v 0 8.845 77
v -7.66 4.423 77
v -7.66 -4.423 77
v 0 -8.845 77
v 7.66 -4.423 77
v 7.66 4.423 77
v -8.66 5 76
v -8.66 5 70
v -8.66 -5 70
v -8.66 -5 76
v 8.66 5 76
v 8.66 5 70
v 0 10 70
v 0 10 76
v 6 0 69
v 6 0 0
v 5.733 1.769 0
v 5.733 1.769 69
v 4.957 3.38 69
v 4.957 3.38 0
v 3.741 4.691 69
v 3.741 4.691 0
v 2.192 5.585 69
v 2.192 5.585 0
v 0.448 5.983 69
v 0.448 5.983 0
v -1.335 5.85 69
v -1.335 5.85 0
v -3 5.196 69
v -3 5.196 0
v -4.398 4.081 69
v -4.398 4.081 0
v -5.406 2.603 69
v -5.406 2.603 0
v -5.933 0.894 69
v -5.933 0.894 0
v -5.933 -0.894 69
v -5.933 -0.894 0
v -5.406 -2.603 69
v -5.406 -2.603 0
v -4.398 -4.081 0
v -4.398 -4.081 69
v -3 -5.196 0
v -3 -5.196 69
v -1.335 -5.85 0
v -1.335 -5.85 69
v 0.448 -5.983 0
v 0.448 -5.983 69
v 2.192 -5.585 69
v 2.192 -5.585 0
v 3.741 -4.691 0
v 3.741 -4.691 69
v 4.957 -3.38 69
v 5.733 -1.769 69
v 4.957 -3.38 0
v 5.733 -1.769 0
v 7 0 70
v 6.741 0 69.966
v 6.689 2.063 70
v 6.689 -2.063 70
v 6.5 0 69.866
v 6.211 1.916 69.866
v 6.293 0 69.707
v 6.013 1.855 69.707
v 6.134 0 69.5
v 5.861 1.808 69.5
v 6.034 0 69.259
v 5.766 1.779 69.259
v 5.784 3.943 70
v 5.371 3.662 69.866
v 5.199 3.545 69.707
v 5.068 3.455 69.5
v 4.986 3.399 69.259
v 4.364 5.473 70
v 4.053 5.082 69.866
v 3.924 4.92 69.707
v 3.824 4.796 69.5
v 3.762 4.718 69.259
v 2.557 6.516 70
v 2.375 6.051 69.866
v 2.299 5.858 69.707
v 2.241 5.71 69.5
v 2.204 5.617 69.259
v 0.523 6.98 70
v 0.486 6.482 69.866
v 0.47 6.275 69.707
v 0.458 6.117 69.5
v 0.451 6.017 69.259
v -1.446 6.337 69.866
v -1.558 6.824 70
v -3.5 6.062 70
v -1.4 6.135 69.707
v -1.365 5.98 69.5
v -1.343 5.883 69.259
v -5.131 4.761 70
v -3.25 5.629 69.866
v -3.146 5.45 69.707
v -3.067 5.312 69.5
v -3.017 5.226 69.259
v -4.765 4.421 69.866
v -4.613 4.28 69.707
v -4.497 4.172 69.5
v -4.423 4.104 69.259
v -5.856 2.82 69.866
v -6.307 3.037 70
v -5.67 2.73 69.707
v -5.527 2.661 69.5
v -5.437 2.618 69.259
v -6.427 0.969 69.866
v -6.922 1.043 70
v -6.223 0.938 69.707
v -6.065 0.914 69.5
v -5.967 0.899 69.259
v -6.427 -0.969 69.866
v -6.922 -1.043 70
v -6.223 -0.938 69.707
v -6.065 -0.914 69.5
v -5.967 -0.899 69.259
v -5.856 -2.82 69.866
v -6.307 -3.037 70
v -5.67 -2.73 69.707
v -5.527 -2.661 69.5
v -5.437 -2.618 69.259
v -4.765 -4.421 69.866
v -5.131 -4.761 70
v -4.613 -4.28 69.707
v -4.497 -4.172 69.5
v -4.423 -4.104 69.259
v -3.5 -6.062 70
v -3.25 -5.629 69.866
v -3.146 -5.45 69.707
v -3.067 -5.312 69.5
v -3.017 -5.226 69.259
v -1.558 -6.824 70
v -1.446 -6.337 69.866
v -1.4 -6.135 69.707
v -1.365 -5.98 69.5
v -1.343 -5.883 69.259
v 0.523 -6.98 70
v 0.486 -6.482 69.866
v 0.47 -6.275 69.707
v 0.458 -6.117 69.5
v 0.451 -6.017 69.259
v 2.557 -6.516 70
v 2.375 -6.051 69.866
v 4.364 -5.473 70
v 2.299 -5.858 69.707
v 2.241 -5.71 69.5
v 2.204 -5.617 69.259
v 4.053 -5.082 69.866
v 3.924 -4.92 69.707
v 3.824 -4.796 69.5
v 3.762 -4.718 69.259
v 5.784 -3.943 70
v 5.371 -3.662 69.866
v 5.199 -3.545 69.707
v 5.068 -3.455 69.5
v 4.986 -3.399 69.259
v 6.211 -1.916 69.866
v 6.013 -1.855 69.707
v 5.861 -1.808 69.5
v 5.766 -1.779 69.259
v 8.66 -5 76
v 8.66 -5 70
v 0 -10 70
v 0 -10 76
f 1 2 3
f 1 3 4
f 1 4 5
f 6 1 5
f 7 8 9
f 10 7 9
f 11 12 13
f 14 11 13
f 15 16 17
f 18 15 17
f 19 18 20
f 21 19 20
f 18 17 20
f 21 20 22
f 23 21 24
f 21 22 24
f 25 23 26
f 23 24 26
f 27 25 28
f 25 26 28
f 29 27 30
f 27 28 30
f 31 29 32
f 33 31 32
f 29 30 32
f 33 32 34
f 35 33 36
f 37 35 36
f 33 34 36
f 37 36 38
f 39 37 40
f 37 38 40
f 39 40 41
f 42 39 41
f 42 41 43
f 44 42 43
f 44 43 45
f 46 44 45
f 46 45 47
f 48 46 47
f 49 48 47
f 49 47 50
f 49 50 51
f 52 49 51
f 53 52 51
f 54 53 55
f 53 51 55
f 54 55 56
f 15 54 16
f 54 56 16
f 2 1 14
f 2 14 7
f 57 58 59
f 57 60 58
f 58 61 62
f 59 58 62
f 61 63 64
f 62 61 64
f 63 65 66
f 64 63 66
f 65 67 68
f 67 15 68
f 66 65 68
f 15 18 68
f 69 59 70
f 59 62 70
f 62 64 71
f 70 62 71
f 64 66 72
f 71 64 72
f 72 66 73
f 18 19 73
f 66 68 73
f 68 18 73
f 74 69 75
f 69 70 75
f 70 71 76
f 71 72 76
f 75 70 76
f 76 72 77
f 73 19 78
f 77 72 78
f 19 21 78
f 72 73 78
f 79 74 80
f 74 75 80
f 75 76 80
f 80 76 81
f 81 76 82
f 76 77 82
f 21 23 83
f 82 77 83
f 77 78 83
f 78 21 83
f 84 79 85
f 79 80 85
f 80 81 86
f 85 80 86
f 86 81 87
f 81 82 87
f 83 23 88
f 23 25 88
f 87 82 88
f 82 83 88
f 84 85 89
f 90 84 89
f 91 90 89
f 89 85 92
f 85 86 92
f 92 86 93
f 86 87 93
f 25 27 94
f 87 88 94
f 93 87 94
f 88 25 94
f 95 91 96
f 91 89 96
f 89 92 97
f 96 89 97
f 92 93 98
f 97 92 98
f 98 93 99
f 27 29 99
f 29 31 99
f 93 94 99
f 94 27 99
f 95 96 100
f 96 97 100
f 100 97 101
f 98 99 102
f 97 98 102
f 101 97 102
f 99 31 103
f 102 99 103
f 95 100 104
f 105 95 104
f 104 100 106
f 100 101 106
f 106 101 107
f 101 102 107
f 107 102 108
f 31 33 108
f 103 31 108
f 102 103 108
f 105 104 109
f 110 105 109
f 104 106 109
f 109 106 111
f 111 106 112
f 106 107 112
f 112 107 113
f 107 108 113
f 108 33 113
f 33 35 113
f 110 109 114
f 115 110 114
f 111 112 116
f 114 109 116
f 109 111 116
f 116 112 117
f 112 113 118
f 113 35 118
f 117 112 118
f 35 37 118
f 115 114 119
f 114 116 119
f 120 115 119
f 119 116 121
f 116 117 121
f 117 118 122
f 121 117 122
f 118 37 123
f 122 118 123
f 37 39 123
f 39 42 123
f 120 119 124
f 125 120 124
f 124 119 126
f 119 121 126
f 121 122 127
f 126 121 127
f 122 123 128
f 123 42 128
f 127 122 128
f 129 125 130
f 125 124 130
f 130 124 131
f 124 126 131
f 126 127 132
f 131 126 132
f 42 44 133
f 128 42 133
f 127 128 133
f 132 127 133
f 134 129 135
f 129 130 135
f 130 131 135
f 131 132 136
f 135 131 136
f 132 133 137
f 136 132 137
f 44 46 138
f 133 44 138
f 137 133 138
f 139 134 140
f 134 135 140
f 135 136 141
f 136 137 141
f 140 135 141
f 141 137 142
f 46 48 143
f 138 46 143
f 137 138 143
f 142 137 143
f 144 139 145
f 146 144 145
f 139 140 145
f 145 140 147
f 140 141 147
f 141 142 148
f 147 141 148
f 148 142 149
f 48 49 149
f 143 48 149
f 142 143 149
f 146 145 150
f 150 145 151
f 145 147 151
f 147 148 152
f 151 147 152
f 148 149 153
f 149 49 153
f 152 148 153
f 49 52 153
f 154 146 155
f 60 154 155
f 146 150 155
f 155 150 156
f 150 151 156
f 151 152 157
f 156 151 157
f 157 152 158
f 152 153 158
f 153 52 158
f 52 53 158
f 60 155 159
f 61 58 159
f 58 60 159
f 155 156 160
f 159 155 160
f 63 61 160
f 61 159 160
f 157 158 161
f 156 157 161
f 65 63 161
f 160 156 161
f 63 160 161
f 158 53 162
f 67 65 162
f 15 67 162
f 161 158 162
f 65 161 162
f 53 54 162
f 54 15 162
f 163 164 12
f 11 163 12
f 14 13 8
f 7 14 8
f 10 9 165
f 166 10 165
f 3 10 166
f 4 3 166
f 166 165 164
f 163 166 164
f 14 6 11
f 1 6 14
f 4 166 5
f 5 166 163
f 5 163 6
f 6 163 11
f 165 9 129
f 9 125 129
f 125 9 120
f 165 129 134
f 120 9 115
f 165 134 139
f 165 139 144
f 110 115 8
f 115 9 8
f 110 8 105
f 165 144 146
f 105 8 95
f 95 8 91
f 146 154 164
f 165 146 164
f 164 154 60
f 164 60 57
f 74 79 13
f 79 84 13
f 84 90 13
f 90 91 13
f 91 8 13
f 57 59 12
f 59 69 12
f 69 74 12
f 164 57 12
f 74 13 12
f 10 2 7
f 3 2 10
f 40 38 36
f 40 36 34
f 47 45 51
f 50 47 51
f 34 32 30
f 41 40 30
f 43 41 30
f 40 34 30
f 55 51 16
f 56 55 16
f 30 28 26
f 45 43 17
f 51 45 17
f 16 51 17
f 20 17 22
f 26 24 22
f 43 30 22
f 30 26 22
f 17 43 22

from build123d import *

# Parameters (mm, degrees)
CROQUIS1_R              = 6
SALIENTE_EXTRUIR3_DEPTH = 70
SALIENTE_EXTRUIR4_DEPTH = 7
CHAFL_N1_SIZE           = 1
REDONDEO1_R             = 1


with BuildPart() as part:
    # Croquis1 → Saliente-Extruir3 (new body)
    with BuildSketch(Plane.XY):
        Circle(CROQUIS1_R)
    extrude(amount=SALIENTE_EXTRUIR3_DEPTH)

    # Croquis3 → Saliente-Extruir4 (add)
    with BuildSketch(Plane.XY.offset(70)):
        Polygon((0, 10), (-8.660254038, 5), (-8.660254038, -5), (0, -10), (8.660254038, -5), (8.660254038, 5), align=None)
    extrude(amount=SALIENTE_EXTRUIR4_DEPTH)

    # Chaflán1
    chafl_n1_edges = [part.edges().sort_by_distance(p)[0] for p in [
        (8.660254038, 0, 77),
        (4.330127019, 7.5, 77),
        (-4.330127019, 7.5, 77),
        (-8.660254038, 0, 77),
        (-4.330127019, -7.5, 77),
        (4.330127019, -7.5, 77),
    ]]
    chamfer(chafl_n1_edges, length=CHAFL_N1_SIZE)

    # Redondeo1
    redondeo1_edges = [part.edges().sort_by_distance(p)[0] for p in [
        (-6, 0, 70),
    ]]
    fillet(redondeo1_edges, radius=REDONDEO1_R)


solid = part.part
